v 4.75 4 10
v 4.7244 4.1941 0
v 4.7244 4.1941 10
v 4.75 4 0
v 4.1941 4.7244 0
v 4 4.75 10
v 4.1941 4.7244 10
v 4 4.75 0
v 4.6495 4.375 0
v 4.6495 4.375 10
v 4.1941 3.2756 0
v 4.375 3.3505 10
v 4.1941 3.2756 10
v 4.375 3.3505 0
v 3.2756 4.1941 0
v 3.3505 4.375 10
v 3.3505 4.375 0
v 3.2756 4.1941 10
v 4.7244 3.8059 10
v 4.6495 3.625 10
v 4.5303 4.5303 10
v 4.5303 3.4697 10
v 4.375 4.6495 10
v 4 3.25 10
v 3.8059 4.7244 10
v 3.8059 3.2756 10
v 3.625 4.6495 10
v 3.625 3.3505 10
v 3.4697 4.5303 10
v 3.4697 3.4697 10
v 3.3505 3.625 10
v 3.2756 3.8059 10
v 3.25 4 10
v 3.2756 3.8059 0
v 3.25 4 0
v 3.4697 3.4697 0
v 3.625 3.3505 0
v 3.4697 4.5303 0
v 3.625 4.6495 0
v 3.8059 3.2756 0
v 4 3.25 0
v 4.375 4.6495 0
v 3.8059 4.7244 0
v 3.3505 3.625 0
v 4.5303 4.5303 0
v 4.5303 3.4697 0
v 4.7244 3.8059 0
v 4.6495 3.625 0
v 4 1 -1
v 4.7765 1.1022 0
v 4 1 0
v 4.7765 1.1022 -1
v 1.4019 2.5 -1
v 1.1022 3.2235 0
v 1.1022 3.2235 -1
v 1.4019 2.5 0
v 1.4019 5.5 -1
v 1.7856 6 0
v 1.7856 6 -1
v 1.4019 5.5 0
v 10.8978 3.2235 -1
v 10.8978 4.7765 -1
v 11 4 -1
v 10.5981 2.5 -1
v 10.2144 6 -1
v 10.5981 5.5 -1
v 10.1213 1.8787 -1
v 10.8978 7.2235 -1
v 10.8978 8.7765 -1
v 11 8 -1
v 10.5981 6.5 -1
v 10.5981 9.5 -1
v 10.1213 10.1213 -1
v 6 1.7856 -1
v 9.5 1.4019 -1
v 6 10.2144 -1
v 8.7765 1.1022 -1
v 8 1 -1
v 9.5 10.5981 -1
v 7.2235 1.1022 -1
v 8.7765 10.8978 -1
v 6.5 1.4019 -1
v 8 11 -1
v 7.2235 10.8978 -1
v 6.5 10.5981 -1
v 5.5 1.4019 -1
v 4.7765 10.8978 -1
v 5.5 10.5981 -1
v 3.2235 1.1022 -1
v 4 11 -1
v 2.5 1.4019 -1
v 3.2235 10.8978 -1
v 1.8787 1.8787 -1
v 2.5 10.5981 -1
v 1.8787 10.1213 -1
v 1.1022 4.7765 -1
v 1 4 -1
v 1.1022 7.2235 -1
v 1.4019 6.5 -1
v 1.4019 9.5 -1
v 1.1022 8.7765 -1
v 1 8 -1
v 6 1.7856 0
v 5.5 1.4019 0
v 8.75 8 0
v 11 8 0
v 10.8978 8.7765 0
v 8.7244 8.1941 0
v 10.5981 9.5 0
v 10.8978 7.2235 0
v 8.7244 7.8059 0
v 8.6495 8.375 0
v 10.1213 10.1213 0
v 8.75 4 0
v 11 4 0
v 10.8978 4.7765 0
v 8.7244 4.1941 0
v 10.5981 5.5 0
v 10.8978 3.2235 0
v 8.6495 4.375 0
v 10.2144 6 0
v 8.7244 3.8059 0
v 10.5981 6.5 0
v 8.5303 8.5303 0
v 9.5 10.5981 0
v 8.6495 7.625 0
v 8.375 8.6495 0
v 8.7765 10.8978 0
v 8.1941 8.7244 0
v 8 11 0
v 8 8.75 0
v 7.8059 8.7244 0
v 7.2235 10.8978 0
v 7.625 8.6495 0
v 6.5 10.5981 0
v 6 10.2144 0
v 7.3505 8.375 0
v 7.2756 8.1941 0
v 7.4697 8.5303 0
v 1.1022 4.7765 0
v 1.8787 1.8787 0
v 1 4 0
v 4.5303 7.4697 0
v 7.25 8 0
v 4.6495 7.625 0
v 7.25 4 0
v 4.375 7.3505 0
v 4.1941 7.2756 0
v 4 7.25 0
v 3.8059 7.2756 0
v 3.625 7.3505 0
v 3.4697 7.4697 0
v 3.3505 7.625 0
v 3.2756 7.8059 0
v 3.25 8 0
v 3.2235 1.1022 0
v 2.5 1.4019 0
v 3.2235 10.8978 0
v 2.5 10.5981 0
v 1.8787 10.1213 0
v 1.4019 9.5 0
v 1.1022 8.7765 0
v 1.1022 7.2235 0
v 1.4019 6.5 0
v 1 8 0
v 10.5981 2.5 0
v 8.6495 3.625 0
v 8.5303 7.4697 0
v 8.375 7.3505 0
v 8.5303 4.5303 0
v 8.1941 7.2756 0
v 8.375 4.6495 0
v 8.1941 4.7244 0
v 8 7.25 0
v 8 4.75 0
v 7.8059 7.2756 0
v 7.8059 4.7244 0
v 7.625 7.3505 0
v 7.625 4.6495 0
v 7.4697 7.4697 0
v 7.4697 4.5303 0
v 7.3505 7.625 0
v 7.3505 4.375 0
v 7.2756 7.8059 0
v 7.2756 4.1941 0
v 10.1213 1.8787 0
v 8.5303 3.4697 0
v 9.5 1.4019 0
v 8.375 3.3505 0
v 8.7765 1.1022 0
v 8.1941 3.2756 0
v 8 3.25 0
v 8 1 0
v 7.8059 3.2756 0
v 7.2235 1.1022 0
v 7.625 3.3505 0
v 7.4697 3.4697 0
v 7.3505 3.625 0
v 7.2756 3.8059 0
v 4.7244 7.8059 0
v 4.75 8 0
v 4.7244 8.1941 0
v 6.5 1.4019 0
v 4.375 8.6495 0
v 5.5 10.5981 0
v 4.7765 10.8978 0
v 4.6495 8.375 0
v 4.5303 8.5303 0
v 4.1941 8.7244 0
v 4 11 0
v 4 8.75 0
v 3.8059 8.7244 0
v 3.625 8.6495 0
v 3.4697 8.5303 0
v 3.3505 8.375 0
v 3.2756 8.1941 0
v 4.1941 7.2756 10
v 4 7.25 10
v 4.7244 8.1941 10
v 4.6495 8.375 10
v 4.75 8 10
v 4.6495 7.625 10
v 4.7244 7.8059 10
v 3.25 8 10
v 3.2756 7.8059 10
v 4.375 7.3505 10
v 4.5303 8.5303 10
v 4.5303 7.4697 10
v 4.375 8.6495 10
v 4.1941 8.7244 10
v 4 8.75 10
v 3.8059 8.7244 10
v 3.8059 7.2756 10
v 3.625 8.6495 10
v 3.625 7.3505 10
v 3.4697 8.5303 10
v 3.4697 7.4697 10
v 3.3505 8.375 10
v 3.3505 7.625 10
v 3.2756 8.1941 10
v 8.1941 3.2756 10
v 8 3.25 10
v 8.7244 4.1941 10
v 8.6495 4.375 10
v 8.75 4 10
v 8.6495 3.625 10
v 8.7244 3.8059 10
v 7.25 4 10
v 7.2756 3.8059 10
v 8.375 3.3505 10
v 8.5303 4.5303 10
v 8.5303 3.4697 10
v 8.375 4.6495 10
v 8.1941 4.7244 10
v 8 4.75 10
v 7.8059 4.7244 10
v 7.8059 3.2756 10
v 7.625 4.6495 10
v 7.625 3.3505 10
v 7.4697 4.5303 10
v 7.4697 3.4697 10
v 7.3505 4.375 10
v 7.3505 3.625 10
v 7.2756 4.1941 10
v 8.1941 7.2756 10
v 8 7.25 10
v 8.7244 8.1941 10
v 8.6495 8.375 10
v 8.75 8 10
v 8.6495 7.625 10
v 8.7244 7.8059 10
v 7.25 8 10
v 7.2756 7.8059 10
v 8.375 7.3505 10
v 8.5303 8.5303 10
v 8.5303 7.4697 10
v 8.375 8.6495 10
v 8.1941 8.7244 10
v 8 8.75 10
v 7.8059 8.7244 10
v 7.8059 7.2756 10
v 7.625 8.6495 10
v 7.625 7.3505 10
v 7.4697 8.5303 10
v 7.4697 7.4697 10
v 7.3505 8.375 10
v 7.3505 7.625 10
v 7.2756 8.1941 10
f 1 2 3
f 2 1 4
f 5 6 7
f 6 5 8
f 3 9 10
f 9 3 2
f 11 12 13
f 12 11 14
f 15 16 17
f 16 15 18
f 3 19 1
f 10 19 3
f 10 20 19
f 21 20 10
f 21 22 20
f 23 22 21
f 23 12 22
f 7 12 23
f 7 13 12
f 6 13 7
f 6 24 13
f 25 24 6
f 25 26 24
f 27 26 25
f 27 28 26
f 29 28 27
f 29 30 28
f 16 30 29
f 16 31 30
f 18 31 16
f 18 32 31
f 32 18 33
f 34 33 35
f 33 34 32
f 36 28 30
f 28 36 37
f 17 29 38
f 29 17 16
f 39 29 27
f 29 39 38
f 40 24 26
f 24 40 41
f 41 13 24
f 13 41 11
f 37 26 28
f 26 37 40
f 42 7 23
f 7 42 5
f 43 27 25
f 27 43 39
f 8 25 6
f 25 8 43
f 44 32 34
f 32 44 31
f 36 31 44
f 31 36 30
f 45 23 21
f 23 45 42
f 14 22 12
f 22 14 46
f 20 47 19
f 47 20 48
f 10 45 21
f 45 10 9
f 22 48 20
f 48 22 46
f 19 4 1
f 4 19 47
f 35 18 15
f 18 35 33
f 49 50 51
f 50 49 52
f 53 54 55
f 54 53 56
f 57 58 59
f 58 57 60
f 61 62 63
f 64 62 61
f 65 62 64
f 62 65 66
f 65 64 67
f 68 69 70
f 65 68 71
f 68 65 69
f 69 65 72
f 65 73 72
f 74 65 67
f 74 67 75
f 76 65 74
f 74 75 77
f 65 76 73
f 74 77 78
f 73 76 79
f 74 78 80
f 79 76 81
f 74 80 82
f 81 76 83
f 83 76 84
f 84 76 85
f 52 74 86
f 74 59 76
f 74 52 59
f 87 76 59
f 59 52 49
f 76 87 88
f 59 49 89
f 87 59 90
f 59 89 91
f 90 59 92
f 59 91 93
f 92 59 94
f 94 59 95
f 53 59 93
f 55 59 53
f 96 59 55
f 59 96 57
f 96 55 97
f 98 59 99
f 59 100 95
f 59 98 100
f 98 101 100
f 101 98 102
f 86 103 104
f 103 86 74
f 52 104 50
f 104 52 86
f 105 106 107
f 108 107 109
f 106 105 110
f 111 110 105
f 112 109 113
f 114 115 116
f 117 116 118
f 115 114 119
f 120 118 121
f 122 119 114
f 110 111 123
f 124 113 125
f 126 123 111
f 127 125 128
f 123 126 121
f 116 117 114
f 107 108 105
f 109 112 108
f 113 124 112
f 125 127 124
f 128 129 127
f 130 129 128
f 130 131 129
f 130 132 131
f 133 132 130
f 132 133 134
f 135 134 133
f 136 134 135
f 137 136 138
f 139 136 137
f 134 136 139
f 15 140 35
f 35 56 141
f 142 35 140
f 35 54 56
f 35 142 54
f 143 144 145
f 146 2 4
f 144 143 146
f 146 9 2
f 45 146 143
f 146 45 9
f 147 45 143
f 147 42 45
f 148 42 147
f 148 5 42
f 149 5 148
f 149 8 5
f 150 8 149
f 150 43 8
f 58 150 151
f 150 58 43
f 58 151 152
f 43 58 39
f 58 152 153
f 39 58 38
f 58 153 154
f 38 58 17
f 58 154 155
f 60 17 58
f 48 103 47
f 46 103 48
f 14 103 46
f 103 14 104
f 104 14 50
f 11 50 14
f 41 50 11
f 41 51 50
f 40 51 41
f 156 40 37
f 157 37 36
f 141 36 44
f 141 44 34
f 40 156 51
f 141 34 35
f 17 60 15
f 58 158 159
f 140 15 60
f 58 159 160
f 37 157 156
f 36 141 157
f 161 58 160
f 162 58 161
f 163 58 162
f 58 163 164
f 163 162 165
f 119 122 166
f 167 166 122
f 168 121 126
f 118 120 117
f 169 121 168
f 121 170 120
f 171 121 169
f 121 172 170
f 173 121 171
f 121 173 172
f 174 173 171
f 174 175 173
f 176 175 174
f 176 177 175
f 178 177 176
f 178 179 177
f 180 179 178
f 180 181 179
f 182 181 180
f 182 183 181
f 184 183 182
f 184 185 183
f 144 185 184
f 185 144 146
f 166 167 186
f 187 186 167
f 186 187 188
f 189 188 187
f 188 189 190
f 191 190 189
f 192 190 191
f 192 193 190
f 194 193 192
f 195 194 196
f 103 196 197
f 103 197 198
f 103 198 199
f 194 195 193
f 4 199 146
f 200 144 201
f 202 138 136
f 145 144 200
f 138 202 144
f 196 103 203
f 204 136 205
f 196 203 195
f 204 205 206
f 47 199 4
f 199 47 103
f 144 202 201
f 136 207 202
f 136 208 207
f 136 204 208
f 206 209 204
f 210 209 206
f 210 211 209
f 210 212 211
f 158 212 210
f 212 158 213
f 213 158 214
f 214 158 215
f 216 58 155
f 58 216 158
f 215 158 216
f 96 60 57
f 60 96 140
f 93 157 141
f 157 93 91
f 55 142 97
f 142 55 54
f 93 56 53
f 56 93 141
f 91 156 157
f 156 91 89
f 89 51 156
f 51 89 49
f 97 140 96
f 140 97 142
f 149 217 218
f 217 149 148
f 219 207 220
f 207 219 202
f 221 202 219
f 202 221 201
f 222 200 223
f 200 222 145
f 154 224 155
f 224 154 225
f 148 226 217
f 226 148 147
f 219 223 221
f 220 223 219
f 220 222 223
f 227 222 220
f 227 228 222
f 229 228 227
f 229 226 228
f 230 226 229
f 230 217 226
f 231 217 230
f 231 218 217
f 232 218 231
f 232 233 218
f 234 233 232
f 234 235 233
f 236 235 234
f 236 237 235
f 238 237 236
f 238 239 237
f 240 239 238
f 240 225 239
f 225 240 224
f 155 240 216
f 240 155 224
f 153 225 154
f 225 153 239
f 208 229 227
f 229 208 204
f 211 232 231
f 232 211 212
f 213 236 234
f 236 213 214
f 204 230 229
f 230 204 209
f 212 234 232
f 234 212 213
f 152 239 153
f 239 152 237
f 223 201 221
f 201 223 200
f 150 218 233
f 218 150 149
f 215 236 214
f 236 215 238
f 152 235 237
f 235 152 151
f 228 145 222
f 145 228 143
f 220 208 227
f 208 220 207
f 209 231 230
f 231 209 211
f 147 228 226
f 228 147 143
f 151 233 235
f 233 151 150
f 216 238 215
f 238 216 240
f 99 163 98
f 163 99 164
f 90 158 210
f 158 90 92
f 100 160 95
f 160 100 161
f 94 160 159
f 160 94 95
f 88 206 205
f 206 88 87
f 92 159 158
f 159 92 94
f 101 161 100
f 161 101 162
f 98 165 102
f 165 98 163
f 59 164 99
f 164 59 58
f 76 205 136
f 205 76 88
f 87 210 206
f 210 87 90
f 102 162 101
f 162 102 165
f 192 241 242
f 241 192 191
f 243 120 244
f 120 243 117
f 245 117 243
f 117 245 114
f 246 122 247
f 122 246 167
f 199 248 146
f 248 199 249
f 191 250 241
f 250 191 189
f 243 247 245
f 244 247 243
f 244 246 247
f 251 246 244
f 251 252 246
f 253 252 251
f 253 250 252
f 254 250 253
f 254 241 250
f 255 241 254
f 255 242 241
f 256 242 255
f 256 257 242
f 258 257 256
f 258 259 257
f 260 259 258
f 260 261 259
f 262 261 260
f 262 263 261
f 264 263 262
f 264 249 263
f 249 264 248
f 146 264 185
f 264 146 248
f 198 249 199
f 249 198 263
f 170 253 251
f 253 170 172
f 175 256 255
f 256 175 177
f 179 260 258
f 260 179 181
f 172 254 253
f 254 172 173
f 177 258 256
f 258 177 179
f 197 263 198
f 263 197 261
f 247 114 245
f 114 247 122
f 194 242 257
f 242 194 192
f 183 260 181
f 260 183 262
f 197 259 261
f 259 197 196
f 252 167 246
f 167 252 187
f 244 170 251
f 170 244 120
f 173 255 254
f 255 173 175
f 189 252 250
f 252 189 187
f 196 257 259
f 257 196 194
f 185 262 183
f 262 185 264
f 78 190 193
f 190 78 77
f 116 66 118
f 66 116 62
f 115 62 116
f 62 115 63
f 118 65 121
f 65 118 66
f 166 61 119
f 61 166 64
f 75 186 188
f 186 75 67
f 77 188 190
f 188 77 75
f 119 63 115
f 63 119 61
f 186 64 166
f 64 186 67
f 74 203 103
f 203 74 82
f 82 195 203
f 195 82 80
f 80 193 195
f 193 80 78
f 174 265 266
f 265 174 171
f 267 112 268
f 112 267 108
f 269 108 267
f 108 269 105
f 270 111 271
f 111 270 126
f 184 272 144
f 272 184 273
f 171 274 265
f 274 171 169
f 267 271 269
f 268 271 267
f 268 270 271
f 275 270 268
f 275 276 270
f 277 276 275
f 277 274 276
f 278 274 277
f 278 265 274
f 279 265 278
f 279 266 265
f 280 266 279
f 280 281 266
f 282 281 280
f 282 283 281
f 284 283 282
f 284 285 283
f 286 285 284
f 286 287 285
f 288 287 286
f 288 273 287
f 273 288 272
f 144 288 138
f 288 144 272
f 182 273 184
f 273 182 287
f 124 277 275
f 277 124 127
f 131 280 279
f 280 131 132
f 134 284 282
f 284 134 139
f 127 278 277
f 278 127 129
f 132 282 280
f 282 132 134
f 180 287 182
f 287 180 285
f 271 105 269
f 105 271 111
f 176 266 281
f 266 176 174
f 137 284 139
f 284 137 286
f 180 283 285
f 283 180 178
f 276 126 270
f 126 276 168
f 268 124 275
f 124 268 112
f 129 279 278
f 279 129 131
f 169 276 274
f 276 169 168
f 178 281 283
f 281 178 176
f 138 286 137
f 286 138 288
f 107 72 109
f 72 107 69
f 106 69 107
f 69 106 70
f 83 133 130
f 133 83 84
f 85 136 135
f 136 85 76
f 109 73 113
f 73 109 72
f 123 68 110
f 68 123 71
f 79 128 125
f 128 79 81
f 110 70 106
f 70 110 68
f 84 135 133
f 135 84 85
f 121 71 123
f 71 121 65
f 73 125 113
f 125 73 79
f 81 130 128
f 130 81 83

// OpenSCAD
module pins
(
	count=[2,2],
	diff=[4,4],
	height=10,
	diam=1.5,

	base_height=1,
	base_diam=6,
	quality=2,
)
{
	cutClr=0.1;
	for(i=[1:count[0]], j=[1:count[1]])
	{
		translate([i*diff[0], j*diff[1], -cutClr])
		cylinder(d=diam, h=height+cutClr, center=false, $fn=quality*12);

		translate([i*diff[0], j*diff[1], -base_height])
		cylinder(d=base_diam, h=base_height, center=false, $fn=quality*12);
	}
}

pins();
